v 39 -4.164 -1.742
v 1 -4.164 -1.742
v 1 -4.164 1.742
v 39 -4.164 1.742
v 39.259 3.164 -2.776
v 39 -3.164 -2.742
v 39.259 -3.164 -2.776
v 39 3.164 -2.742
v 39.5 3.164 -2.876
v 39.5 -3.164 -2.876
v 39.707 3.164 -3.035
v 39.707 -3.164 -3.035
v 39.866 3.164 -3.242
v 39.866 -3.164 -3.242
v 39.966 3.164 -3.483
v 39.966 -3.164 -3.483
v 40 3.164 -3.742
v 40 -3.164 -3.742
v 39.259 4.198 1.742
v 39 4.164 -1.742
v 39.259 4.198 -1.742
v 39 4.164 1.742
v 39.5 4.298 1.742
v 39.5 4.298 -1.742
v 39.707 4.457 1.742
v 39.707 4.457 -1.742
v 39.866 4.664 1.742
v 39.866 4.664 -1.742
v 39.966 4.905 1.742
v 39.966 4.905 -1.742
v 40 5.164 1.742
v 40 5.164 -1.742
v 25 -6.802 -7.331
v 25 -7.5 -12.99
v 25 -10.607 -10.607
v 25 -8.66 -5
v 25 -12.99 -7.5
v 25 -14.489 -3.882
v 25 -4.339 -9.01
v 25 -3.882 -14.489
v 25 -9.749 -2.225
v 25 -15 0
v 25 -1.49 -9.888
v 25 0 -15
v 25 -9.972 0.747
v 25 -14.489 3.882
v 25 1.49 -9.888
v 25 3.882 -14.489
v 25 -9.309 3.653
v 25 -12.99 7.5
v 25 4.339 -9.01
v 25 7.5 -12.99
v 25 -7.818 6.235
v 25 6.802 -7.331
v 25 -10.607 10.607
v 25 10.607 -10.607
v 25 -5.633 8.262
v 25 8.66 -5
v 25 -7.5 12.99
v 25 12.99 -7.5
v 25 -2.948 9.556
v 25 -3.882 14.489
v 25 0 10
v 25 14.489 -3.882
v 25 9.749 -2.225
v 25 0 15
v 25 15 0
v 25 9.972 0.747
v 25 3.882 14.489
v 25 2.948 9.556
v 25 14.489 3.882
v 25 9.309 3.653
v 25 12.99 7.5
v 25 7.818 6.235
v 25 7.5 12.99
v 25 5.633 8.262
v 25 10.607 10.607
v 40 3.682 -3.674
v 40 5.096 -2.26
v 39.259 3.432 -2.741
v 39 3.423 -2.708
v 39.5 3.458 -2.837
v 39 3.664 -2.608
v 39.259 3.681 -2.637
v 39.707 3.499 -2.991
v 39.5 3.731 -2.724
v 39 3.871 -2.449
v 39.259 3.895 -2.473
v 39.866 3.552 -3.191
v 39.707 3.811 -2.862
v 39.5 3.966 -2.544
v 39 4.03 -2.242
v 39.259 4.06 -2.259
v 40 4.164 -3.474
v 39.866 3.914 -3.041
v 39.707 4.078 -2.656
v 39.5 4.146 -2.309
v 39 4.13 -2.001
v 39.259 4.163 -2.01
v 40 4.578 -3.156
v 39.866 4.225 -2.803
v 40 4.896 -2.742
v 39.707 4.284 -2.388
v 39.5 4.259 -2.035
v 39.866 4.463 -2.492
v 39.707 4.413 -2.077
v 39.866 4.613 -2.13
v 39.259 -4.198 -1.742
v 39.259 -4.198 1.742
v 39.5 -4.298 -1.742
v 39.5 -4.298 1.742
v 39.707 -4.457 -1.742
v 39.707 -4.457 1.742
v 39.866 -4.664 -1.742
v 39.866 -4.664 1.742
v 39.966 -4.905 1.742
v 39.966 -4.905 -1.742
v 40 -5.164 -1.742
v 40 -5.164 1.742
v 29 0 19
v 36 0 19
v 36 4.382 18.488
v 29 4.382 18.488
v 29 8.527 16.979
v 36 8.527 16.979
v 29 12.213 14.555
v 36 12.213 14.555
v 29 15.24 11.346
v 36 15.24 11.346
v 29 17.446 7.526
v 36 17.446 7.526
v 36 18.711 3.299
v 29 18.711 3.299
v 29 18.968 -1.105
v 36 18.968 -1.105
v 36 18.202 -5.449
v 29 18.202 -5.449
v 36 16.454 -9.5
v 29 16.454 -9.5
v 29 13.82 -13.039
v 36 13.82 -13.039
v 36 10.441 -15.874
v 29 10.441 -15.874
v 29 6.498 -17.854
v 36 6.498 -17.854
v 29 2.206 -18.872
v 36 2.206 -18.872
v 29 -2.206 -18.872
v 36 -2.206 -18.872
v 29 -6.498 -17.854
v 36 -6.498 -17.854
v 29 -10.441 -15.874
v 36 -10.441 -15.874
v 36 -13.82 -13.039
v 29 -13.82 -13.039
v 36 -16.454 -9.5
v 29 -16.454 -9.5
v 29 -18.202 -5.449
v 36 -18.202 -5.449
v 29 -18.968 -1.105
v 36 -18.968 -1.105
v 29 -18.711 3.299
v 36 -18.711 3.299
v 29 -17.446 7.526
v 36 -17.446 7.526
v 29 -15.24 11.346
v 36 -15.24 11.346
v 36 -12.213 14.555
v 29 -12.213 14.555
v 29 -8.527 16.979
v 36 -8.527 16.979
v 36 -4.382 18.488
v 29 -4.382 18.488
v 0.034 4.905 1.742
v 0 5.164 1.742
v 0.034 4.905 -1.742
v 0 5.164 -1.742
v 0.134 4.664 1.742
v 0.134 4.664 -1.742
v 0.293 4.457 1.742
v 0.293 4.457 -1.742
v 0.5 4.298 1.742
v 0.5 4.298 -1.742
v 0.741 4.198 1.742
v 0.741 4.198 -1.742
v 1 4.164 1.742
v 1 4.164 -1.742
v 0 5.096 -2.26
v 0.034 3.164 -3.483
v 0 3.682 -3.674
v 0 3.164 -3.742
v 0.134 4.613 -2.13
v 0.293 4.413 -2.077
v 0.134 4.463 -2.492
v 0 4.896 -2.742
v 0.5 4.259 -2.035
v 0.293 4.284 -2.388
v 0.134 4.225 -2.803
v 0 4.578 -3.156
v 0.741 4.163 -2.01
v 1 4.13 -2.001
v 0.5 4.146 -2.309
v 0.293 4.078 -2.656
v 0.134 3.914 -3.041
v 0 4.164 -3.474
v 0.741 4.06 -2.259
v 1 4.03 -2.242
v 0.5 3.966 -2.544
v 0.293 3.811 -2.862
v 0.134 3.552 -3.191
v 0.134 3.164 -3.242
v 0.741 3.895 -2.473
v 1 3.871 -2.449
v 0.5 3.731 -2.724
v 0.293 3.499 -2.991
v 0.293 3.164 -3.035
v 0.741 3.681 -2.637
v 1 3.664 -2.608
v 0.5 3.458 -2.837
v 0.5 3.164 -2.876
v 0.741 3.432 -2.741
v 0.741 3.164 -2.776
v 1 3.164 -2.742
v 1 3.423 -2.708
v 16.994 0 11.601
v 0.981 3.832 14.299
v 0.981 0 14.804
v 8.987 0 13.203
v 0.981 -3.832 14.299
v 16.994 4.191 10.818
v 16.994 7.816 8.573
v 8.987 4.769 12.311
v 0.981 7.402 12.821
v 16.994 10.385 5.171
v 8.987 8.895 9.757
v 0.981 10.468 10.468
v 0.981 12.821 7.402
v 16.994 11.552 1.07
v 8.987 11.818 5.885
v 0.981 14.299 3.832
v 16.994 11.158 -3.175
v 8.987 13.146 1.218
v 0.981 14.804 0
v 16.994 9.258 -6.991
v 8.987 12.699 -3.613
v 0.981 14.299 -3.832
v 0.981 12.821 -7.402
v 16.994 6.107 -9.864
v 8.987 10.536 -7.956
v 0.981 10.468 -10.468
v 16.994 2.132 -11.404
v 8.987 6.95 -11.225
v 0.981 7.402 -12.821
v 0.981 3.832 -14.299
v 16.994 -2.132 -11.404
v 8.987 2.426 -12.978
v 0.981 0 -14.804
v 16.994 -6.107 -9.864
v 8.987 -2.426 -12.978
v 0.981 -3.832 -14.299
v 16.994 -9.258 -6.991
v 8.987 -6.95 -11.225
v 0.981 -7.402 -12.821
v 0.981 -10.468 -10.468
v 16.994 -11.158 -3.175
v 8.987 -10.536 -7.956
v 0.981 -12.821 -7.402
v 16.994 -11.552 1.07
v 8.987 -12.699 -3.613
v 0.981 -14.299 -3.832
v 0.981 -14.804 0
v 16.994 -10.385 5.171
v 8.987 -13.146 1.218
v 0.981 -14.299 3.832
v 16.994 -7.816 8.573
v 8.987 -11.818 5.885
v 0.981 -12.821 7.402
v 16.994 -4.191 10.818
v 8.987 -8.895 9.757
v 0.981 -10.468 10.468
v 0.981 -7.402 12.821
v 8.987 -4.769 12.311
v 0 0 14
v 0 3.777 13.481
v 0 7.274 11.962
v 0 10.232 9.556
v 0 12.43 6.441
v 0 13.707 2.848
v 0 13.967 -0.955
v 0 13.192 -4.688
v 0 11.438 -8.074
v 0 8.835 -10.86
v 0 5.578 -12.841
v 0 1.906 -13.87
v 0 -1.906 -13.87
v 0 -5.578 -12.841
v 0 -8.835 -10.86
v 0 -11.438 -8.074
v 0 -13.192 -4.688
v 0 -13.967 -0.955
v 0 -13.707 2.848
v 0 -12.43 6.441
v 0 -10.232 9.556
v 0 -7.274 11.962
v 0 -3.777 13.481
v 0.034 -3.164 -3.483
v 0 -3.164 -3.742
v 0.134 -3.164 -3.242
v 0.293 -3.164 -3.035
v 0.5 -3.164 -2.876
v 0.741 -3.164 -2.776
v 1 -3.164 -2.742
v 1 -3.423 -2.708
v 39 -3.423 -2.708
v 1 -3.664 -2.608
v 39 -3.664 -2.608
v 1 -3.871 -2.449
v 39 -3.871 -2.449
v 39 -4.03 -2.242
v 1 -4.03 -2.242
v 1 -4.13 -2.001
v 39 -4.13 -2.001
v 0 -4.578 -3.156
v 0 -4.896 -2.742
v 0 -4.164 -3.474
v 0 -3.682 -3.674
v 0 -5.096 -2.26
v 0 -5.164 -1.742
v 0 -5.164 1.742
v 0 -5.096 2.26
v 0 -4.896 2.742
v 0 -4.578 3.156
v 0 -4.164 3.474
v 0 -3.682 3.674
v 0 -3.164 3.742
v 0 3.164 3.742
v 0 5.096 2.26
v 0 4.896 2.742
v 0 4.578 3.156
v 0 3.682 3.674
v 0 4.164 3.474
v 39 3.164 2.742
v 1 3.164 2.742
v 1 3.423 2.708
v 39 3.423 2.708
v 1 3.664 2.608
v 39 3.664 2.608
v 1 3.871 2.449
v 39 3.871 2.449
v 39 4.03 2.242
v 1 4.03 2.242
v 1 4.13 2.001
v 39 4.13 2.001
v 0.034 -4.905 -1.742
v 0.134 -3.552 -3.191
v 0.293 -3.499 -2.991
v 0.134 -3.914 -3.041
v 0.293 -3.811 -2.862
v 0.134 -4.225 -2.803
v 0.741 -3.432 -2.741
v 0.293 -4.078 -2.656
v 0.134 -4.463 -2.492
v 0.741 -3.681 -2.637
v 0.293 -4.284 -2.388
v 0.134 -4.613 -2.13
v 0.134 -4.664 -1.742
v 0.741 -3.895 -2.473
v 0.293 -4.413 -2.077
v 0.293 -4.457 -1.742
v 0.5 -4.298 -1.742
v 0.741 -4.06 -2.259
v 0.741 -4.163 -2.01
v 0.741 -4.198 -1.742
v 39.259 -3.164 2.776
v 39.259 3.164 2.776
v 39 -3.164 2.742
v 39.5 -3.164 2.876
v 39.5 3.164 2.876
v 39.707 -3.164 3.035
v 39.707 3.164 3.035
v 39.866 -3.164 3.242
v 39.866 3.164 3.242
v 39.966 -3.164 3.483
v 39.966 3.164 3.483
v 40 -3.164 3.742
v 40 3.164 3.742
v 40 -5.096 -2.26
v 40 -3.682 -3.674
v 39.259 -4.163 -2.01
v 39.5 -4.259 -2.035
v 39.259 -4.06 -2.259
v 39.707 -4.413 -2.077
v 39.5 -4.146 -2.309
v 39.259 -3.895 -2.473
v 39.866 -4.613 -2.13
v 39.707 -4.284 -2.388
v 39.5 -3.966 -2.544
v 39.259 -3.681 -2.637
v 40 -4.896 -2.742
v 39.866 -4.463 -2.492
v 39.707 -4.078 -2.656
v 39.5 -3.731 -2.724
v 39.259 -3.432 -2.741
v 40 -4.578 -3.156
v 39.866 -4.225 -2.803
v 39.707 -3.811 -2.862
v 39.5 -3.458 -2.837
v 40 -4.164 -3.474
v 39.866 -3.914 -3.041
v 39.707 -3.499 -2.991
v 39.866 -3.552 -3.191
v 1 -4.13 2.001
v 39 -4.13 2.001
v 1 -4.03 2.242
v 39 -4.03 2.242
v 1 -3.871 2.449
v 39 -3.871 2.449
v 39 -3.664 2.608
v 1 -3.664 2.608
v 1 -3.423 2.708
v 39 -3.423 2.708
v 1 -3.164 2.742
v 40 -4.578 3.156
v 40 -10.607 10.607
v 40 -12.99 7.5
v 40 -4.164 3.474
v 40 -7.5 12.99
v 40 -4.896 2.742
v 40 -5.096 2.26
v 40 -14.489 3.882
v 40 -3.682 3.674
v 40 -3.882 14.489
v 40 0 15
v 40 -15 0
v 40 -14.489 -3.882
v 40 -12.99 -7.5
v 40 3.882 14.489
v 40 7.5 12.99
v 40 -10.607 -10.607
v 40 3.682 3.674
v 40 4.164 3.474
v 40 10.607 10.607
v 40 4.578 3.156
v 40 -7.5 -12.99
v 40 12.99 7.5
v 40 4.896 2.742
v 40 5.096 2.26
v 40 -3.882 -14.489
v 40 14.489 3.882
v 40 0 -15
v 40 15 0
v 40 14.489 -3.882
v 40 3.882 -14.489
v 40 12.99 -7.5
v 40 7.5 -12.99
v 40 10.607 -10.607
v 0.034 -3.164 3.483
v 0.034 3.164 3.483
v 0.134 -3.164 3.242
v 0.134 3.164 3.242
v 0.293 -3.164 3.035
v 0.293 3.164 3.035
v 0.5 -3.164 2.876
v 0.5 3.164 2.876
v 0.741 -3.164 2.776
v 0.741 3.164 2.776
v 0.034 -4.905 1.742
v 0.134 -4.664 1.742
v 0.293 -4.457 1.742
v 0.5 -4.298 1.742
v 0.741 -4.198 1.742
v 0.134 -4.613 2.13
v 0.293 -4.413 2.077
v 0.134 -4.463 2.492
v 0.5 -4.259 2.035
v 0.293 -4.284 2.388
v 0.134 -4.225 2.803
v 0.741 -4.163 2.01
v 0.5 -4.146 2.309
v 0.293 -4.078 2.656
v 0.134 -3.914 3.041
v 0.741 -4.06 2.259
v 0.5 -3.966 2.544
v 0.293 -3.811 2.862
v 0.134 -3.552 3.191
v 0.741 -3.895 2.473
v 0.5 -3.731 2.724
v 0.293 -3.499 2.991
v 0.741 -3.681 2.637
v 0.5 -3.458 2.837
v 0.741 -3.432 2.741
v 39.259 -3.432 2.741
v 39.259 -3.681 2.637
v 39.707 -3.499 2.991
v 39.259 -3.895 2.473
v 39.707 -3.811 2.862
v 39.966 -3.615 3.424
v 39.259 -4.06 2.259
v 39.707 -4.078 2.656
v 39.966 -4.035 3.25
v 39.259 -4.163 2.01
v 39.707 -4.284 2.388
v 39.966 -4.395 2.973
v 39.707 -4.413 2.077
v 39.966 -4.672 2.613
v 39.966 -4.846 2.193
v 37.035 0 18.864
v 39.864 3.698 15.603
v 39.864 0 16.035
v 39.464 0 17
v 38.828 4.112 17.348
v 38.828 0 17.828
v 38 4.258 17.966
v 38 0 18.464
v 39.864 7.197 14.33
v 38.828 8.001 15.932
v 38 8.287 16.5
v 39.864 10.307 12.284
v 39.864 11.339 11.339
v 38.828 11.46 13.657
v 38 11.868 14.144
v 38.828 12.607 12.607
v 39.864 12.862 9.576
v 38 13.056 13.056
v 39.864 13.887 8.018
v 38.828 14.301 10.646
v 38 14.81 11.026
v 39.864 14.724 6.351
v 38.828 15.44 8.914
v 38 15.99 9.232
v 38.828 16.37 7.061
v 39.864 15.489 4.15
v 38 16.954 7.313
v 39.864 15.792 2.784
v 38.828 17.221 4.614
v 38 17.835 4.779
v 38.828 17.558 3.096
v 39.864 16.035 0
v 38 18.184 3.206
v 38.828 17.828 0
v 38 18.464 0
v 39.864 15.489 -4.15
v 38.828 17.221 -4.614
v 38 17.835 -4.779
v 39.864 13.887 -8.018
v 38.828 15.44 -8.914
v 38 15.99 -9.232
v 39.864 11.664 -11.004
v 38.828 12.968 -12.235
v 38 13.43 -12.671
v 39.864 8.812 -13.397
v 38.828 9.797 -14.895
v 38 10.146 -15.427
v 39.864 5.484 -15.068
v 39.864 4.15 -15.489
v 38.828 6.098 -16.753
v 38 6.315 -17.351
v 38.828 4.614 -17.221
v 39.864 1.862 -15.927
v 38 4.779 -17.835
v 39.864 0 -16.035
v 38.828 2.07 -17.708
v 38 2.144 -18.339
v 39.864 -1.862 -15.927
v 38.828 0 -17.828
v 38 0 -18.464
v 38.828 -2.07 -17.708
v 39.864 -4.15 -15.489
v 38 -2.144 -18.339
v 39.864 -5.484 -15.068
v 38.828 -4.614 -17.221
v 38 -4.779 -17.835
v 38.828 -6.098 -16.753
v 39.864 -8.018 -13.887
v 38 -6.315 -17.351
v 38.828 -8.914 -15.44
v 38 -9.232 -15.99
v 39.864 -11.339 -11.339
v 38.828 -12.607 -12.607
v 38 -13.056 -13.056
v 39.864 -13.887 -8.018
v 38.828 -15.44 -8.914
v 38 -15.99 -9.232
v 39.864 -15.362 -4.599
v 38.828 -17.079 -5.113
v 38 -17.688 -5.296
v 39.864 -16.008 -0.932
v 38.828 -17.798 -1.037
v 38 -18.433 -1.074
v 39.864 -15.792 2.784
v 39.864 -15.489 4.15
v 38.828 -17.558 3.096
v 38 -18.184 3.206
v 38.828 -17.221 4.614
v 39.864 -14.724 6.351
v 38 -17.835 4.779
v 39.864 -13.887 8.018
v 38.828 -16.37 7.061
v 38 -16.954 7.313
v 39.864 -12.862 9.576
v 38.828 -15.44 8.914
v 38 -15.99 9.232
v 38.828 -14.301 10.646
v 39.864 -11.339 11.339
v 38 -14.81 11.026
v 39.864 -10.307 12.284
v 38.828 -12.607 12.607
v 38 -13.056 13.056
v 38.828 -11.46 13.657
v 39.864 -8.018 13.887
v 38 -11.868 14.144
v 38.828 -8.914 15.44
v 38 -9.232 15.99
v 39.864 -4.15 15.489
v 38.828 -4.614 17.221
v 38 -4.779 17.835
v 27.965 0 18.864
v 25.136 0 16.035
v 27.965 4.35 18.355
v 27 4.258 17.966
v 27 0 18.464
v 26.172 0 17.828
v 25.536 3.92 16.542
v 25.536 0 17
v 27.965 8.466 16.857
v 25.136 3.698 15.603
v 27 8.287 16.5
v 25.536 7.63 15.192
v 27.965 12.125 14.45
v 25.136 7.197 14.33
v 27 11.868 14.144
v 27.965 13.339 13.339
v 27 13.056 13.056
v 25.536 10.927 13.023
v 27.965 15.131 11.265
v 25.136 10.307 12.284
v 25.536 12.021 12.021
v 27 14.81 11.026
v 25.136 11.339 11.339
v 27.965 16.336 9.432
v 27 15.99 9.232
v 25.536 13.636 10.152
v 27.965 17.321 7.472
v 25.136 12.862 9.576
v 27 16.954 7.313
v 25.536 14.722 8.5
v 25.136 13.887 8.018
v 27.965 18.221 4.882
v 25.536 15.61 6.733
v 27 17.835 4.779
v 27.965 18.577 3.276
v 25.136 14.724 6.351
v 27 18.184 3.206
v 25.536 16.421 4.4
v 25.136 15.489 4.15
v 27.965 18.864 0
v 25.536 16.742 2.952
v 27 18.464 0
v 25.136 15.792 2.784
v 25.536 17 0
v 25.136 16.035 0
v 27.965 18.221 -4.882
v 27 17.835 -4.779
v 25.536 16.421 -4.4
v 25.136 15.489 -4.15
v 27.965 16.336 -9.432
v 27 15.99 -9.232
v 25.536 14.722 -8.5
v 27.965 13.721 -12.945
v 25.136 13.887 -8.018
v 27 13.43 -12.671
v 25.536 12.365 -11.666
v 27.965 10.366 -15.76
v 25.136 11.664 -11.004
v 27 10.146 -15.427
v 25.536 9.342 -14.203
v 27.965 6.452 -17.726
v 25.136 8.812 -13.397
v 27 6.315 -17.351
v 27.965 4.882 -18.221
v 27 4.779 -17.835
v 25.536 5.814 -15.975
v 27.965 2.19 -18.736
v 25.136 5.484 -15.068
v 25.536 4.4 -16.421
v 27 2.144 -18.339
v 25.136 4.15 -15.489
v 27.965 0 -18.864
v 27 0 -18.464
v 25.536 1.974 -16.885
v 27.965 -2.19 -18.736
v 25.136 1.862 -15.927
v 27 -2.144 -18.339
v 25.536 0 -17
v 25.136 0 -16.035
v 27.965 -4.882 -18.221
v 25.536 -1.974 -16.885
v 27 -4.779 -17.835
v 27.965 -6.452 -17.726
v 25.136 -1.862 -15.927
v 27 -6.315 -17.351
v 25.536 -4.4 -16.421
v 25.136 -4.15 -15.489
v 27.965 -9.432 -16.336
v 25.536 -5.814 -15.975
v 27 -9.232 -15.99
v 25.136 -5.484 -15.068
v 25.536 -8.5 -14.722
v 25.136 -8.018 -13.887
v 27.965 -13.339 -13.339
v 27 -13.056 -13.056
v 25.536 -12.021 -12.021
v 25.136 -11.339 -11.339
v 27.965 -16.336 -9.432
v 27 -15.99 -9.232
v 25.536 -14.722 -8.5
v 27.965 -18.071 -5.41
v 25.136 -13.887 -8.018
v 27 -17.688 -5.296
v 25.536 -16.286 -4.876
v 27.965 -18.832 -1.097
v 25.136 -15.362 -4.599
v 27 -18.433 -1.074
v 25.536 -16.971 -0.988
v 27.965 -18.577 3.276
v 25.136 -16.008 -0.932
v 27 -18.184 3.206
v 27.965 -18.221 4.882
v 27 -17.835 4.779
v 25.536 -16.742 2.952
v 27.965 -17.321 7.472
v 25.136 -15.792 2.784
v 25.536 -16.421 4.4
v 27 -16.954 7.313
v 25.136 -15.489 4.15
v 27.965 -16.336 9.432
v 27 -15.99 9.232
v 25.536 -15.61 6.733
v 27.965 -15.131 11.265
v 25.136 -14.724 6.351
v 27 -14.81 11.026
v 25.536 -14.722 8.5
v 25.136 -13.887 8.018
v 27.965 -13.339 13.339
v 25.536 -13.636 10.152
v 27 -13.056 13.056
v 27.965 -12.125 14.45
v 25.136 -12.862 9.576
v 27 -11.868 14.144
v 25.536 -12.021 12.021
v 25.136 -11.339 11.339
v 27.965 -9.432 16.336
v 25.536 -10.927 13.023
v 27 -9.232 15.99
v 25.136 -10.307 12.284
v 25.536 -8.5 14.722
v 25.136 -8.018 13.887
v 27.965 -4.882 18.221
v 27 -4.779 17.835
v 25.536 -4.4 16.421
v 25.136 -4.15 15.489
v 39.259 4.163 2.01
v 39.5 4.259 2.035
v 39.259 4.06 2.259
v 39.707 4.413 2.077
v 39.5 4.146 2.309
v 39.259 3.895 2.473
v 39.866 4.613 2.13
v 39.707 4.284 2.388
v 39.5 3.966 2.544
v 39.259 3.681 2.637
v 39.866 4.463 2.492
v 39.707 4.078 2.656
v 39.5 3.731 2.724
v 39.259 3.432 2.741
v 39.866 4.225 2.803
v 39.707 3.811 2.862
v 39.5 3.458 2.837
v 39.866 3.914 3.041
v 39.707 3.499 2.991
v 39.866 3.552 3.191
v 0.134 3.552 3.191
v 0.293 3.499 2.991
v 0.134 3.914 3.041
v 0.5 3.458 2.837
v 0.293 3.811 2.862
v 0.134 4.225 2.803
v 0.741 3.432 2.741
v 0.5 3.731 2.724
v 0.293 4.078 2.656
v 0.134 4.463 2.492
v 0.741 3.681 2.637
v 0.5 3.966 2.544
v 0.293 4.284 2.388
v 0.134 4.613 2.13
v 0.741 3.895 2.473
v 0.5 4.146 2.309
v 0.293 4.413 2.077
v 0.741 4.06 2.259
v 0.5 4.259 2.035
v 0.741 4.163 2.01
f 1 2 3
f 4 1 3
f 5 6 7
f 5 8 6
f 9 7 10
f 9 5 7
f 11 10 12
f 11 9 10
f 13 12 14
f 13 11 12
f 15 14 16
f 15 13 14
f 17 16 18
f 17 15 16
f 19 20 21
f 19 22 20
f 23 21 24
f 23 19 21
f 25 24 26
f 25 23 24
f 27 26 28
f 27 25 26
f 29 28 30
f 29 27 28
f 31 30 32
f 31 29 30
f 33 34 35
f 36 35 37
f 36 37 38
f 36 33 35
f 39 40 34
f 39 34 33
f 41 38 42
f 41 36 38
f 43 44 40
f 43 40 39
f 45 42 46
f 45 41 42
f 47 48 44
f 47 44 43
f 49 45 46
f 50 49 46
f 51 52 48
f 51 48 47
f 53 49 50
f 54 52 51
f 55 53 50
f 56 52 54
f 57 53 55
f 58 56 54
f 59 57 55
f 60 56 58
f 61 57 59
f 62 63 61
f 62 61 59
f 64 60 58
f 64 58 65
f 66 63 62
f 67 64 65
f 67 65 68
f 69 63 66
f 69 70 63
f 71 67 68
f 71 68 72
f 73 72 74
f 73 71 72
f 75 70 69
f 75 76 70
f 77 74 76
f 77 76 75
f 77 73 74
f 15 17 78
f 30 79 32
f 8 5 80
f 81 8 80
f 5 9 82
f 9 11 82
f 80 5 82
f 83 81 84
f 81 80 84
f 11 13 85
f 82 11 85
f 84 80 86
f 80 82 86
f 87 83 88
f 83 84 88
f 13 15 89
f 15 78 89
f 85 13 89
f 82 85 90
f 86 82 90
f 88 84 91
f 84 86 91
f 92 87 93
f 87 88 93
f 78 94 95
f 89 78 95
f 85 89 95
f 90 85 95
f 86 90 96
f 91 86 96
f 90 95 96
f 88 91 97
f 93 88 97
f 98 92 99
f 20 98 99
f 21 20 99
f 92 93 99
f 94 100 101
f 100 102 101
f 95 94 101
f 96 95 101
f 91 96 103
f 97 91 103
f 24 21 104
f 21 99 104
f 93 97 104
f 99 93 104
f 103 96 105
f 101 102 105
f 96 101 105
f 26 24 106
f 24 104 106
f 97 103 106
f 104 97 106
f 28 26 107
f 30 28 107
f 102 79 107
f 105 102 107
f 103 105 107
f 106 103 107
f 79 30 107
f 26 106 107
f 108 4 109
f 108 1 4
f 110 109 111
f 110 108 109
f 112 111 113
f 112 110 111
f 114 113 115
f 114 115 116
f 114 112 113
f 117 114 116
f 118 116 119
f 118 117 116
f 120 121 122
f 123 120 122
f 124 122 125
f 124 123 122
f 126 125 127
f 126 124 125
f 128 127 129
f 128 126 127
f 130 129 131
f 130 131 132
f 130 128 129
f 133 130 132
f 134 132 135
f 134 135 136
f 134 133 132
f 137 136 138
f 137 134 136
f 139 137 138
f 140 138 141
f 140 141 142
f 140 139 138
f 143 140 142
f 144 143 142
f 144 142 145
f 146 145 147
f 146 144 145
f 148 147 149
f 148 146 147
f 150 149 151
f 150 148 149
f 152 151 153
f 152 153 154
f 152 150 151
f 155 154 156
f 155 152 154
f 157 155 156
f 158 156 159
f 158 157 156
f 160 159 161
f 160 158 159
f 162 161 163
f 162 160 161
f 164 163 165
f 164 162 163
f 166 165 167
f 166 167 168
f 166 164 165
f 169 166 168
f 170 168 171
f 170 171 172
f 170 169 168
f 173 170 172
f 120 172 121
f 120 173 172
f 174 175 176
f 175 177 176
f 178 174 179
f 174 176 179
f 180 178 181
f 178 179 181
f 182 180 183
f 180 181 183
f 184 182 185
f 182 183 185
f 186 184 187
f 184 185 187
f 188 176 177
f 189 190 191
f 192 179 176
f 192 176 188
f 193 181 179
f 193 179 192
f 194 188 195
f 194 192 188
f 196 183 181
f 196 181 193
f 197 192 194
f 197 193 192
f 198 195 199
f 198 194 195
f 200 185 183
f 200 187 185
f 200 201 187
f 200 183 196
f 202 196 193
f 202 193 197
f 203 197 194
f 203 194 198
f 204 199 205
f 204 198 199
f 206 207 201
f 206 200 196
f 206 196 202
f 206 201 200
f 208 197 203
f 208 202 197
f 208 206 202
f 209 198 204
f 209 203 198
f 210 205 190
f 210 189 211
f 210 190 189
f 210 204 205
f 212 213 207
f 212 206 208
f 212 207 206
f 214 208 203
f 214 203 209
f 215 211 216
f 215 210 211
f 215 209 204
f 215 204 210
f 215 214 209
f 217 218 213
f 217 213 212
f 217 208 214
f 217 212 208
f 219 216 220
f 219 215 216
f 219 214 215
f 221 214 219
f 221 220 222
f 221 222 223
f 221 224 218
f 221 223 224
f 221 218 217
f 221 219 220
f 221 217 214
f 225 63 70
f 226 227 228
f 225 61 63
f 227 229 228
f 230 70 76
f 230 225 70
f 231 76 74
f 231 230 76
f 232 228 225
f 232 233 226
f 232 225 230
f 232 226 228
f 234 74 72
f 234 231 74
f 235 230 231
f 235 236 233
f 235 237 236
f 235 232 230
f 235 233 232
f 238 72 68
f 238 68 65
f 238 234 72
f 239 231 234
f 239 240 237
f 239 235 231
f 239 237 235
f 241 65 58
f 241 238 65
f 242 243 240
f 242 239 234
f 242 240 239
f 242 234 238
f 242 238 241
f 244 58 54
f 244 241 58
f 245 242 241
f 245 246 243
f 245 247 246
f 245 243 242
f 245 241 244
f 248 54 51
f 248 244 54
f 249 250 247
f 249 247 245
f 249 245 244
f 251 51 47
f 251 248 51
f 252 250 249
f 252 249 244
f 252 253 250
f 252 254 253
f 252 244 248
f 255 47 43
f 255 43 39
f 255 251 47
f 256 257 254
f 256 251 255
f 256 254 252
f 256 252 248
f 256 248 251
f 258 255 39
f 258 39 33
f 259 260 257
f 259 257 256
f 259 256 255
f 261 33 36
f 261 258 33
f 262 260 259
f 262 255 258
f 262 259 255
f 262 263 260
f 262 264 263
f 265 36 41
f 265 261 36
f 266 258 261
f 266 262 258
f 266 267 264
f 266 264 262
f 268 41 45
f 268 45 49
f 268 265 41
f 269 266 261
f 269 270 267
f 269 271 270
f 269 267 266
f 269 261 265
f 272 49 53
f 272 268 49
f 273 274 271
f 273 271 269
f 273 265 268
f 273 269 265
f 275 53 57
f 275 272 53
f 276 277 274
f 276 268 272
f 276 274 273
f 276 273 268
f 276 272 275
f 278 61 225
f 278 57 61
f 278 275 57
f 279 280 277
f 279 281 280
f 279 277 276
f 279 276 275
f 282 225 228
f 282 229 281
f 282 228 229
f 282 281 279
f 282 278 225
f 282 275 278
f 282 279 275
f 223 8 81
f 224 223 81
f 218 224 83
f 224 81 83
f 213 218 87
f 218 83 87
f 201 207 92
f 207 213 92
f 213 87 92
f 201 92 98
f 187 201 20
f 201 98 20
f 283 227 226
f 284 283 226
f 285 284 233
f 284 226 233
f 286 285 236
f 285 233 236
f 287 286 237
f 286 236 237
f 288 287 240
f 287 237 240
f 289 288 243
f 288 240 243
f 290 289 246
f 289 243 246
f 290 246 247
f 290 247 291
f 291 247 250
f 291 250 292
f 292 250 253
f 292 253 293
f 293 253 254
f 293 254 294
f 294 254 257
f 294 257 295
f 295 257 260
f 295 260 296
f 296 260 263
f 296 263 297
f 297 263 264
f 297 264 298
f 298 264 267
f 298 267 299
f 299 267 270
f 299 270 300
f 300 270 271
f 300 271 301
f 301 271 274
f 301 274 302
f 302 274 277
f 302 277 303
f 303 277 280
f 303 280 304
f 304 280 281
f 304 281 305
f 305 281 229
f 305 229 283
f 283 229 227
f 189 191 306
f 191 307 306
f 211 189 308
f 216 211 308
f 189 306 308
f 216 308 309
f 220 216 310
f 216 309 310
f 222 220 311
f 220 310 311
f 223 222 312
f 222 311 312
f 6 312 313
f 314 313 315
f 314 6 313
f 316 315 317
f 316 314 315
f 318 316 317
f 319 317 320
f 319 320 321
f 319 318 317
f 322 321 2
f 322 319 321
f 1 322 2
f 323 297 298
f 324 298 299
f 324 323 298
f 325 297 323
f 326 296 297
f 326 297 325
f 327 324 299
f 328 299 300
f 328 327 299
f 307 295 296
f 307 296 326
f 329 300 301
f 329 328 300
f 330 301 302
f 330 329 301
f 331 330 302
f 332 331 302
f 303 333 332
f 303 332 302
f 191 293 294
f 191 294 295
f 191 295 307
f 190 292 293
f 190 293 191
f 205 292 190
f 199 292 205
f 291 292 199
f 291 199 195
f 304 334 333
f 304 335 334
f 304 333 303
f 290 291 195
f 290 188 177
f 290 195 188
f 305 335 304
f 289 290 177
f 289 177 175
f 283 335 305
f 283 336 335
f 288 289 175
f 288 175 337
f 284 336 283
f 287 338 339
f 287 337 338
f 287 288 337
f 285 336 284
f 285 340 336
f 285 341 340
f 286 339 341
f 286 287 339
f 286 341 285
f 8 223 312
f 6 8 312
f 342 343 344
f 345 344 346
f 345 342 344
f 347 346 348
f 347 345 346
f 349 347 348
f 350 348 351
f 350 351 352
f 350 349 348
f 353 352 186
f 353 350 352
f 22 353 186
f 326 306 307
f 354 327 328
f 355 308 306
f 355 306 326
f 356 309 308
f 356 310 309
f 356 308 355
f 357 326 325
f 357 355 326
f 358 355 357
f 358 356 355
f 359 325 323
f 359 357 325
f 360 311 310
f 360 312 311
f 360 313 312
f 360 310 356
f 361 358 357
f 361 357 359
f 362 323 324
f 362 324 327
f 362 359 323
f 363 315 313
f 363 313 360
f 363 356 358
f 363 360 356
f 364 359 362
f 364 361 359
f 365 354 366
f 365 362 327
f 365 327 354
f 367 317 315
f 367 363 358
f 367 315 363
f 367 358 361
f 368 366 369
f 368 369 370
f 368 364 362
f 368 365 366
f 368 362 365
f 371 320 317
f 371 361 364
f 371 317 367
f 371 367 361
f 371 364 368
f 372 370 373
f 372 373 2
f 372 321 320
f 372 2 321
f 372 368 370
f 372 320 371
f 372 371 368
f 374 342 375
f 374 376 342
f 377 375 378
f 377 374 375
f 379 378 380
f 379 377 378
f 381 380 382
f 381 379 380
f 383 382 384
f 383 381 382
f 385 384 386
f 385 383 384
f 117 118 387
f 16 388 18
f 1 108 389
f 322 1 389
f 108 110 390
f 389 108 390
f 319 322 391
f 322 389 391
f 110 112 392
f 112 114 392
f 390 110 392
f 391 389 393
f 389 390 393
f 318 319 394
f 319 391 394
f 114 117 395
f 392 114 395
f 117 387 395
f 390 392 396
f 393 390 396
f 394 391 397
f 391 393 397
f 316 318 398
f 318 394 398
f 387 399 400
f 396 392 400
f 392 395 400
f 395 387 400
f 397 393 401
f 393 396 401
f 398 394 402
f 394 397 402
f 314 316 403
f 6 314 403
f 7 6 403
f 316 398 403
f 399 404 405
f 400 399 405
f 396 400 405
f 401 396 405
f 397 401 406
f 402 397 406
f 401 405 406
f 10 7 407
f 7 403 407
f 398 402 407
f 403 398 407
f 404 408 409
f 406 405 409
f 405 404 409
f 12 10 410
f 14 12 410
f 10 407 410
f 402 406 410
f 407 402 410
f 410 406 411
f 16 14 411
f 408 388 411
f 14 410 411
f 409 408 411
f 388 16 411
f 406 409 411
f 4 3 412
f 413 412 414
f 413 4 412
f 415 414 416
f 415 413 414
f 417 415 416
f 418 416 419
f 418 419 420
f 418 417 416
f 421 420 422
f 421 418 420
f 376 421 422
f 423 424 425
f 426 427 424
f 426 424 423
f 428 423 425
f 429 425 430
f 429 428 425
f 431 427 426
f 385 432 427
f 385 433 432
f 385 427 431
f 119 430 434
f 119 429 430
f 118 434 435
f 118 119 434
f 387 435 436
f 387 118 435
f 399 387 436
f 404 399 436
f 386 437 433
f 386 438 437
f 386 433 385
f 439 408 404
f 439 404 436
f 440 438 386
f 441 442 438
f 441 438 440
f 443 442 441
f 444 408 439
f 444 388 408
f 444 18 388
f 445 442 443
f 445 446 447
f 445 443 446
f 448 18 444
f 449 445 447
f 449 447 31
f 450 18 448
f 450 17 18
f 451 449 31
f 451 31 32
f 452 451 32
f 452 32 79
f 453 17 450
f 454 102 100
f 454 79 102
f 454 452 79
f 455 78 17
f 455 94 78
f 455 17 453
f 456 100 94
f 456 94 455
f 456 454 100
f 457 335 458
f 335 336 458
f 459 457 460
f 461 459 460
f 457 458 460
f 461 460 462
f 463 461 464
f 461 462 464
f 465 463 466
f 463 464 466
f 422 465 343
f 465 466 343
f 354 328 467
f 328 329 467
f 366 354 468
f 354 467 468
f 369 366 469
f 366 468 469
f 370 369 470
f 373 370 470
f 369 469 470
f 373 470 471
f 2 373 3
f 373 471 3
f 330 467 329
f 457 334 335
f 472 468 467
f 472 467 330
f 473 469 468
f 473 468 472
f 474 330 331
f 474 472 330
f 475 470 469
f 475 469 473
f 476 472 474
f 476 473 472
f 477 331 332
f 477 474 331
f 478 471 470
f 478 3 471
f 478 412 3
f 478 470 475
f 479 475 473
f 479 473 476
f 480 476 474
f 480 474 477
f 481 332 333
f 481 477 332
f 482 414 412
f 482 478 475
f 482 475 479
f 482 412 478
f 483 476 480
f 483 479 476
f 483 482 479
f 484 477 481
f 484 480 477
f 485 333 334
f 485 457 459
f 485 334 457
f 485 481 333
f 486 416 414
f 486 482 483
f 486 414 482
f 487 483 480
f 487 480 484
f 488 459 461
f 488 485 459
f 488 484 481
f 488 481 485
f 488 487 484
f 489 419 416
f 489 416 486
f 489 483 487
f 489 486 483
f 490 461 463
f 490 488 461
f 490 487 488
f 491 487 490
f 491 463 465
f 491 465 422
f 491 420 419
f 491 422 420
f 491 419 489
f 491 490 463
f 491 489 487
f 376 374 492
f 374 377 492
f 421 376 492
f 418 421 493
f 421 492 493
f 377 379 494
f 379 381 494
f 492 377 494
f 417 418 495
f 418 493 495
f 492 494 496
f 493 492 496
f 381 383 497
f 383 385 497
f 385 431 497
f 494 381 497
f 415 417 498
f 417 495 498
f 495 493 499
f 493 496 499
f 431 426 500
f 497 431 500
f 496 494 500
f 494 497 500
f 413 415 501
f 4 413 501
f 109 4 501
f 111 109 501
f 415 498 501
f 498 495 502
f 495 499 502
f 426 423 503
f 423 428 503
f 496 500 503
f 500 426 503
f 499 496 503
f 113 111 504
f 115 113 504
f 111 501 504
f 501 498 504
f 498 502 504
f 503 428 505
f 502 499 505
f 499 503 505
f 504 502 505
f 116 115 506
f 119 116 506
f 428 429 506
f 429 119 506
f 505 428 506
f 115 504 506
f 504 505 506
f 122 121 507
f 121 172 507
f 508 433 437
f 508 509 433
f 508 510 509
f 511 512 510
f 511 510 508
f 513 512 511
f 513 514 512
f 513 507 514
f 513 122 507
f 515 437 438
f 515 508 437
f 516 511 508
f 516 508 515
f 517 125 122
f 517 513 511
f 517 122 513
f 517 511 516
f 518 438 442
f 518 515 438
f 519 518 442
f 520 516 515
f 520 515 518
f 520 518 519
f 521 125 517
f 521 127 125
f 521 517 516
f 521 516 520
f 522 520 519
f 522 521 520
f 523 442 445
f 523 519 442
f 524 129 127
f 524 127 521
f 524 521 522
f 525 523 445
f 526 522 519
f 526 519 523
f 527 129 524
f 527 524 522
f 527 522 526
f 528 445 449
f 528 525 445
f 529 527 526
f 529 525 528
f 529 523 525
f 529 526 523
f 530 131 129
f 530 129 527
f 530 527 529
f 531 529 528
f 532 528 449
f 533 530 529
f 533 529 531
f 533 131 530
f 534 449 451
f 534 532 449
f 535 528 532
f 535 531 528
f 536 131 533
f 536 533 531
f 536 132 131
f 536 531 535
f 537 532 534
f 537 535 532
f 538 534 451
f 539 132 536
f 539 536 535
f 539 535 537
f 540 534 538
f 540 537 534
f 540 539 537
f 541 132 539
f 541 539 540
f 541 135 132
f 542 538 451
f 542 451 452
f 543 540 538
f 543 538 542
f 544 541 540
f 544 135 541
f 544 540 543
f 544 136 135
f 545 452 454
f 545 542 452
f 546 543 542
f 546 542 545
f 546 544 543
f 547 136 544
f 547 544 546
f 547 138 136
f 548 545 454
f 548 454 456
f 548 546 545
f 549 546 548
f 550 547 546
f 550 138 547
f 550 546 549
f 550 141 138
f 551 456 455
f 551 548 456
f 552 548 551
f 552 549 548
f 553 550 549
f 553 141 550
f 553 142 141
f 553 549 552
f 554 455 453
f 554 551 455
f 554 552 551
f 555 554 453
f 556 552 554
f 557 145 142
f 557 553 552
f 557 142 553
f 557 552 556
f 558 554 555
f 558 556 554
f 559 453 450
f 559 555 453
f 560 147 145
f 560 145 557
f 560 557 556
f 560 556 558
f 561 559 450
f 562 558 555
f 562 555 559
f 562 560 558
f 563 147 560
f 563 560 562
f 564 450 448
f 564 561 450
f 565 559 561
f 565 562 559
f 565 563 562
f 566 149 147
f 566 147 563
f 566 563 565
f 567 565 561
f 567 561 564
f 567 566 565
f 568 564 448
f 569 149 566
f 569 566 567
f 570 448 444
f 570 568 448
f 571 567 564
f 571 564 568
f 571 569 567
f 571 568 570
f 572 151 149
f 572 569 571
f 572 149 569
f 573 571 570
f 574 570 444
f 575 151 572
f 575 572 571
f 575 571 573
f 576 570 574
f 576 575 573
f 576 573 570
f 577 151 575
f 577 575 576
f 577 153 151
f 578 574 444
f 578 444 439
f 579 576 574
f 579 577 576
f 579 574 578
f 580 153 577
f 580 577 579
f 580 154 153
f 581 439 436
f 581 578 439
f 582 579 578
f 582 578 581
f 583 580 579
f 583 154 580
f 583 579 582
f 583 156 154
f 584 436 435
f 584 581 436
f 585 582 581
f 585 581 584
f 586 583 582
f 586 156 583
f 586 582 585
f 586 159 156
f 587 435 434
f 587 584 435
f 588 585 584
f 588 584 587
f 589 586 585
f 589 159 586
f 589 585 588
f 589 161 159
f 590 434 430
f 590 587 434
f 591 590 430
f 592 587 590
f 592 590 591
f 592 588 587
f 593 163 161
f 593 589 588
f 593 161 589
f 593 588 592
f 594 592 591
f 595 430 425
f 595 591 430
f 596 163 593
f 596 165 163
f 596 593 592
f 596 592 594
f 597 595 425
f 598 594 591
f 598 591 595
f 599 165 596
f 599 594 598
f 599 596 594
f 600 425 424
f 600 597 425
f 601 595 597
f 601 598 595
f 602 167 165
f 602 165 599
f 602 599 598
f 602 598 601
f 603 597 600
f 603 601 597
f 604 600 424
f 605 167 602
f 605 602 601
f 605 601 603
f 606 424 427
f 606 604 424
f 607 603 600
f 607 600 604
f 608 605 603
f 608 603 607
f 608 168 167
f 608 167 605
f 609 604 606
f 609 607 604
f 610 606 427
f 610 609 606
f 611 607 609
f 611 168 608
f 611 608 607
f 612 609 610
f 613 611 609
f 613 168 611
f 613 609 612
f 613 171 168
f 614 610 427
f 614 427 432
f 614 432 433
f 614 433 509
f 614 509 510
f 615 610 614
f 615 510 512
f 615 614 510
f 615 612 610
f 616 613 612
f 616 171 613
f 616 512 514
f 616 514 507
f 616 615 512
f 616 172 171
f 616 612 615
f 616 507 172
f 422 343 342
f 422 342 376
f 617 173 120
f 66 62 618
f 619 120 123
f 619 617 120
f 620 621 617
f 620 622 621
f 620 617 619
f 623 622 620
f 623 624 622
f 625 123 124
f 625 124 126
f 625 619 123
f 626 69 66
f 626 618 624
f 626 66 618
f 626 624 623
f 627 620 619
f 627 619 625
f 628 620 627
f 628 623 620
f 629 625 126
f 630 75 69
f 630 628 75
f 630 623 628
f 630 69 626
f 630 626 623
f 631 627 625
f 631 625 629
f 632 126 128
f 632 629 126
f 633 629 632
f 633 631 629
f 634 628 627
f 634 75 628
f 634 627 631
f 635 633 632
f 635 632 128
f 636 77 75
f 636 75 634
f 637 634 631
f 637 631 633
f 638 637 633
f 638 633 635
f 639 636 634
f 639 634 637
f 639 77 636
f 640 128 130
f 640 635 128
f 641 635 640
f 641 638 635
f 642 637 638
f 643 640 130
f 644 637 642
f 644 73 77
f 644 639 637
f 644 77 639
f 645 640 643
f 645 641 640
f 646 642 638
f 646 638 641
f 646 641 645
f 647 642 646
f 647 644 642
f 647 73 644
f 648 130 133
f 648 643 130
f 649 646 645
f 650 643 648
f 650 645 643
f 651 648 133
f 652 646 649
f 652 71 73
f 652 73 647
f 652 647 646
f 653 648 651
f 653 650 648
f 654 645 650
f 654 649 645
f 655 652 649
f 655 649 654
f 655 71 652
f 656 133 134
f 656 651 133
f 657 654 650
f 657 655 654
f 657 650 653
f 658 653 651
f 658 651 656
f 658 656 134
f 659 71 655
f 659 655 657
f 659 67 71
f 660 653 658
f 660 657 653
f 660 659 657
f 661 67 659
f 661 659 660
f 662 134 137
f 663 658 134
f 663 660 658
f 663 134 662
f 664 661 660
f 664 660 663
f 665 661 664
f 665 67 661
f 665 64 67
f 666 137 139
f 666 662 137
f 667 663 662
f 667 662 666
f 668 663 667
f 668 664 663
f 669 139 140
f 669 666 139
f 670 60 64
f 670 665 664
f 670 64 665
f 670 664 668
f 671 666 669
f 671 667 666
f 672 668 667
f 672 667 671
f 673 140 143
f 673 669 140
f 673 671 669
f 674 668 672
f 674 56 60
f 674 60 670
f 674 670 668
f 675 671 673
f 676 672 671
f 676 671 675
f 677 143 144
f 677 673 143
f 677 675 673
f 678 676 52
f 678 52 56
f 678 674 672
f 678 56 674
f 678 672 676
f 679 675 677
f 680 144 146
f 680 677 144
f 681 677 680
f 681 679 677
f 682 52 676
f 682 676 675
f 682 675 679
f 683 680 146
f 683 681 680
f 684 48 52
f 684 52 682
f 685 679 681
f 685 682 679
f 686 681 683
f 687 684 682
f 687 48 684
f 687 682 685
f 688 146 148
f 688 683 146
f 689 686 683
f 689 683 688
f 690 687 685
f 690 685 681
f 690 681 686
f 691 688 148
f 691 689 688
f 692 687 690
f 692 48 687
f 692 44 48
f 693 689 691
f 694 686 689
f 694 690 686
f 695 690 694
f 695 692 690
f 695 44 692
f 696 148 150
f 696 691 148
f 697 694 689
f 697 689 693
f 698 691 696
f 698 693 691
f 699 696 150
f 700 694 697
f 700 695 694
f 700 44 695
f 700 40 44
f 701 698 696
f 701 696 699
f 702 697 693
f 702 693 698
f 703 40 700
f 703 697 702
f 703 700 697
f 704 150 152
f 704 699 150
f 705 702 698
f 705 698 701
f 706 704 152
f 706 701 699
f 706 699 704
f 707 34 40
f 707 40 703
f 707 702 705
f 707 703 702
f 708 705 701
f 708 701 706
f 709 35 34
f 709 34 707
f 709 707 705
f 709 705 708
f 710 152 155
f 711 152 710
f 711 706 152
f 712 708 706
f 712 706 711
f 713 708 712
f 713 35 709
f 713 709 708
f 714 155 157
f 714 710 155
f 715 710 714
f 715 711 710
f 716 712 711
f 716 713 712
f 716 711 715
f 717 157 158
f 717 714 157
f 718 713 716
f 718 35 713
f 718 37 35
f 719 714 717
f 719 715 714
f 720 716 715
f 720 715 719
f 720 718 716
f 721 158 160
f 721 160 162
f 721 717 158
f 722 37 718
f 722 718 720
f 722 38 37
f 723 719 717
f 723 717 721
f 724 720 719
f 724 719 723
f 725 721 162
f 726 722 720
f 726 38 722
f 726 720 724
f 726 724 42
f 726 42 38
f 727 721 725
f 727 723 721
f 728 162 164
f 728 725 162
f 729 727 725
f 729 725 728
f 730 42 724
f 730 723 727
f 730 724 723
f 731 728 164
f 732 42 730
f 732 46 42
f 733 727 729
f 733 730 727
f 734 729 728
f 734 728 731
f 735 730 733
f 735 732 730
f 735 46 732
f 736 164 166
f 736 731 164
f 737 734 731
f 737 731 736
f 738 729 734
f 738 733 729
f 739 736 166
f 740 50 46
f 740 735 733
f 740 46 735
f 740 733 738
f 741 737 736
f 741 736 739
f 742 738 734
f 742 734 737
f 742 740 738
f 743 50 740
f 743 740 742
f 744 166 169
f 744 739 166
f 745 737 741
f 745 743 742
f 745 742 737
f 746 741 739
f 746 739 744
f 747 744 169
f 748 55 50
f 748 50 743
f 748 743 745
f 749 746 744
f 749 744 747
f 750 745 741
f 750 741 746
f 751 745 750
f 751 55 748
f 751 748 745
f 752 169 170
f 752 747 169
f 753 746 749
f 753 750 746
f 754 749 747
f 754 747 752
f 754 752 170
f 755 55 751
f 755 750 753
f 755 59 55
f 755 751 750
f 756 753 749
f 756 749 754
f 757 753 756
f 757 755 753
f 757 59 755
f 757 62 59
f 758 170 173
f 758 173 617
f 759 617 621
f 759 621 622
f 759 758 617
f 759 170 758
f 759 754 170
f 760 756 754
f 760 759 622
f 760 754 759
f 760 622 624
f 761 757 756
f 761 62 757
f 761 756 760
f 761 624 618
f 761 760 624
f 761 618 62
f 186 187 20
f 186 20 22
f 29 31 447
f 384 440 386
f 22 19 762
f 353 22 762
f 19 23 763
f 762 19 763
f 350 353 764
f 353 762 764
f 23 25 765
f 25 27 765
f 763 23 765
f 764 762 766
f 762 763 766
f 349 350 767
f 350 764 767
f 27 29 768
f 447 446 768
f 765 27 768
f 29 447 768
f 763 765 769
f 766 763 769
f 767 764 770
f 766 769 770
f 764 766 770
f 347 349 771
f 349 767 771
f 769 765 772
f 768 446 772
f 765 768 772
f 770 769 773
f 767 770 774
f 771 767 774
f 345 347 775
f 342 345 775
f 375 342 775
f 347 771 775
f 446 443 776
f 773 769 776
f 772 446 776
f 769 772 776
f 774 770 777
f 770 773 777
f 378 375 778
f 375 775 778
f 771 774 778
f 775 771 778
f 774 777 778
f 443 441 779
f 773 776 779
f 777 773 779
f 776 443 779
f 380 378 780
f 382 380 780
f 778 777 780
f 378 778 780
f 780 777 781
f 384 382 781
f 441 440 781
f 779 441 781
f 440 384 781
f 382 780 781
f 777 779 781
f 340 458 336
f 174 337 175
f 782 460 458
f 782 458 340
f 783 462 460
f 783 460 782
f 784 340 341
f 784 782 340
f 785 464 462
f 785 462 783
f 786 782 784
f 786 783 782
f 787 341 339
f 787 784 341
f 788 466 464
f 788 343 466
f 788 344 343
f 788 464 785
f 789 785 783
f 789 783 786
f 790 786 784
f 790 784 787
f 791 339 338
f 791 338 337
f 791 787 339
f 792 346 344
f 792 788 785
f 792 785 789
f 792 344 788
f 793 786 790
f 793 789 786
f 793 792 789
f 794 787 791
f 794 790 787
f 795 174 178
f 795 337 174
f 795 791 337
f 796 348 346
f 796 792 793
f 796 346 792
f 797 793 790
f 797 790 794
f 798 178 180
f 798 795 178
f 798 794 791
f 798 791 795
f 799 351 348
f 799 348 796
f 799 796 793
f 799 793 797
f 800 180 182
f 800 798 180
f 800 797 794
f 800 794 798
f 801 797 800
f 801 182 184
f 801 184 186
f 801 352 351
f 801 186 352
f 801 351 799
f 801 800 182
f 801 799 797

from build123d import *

# Parameters (mm, degrees)
F2_W     = 8.328109514
F2_H     = 5.4839188233
F3_DEPTH = 40.001
F4_SIZE  = 1
F5_F1_R  = 1
F5_F2_R  = 1
F5_F3_R  = 1


with BuildPart() as f1:
    # F0 (on Front) → F1 (revolve)
    with BuildSketch(Plane.XZ):
        with BuildLine():
            Line((0, 15), (0, 0))
            Line((0, 0), (40, 0))
            Line((40, 0), (40, 15))
            ThreePointArc((40, 15), (38.8284271247, 17.8284271247), (36, 19))
            Line((36, 19), (29, 19))
            ThreePointArc((29, 19), (26.1715728753, 17.8284271247), (25, 15))
            Line((25, 15), (25, 10))
            Line((25, 10), (0, 15))
        make_face()
    revolve(axis=Axis((20, 0, 0), (-1, 0, 0)))

    # F2 (on face) → F3 (cut, through all)
    with BuildSketch(Plane(origin=(0, 0, 0), x_dir=(0, -1, 0), z_dir=(-1, 0, 0))):
        Rectangle(F2_W, F2_H)
    extrude(amount=-F3_DEPTH, mode=Mode.SUBTRACT)

    # F4
    f4_edges = [f1.edges().sort_by_distance(p)[0] for p in [
        (0, 0, -15),
    ]]
    chamfer(f4_edges, length=F4_SIZE)

    # F5: fillet of radius 1 on 8 edges, made by hand

    # F5_f1
    f5_f1_edges = [f1.edges().sort_by_distance(p)[0] for p in [
        (20, -4.164054757, 2.7419594117),
        (20, -4.164054757, -2.7419594117),
        (20, 4.164054757, 2.7419594117),
        (20, 4.164054757, -2.7419594117),
    ]]
    fillet(f5_f1_edges, radius=F5_F1_R)

    # F5_f2
    f5_f2_edges = [f1.edges().sort_by_distance(p)[0] for p in [
        (0, -4.164054757, 0),
        (0, 4.164054757, 0),
        (0, 3.8711615382, 2.4490661928),
        (0, 3.8711615382, -2.4490661928),
        (0, -3.8711615382, -2.4490661928),
        (0, -3.8711615382, 2.4490661928),
    ]]
    fillet(f5_f2_edges, radius=F5_F2_R)

    # F5_f3
    f5_f3_edges = [f1.edges().sort_by_distance(p)[0] for p in [
        (40, -4.164054757, 0),
        (40, 0, -2.7419594117),
        (40, -3.8711615382, -2.4490661928),
        (40, 3.8711615382, -2.4490661928),
        (40, -3.8711615382, 2.4490661928),
    ]]
    fillet(f5_f3_edges, radius=F5_F3_R)


solid = f1.part
